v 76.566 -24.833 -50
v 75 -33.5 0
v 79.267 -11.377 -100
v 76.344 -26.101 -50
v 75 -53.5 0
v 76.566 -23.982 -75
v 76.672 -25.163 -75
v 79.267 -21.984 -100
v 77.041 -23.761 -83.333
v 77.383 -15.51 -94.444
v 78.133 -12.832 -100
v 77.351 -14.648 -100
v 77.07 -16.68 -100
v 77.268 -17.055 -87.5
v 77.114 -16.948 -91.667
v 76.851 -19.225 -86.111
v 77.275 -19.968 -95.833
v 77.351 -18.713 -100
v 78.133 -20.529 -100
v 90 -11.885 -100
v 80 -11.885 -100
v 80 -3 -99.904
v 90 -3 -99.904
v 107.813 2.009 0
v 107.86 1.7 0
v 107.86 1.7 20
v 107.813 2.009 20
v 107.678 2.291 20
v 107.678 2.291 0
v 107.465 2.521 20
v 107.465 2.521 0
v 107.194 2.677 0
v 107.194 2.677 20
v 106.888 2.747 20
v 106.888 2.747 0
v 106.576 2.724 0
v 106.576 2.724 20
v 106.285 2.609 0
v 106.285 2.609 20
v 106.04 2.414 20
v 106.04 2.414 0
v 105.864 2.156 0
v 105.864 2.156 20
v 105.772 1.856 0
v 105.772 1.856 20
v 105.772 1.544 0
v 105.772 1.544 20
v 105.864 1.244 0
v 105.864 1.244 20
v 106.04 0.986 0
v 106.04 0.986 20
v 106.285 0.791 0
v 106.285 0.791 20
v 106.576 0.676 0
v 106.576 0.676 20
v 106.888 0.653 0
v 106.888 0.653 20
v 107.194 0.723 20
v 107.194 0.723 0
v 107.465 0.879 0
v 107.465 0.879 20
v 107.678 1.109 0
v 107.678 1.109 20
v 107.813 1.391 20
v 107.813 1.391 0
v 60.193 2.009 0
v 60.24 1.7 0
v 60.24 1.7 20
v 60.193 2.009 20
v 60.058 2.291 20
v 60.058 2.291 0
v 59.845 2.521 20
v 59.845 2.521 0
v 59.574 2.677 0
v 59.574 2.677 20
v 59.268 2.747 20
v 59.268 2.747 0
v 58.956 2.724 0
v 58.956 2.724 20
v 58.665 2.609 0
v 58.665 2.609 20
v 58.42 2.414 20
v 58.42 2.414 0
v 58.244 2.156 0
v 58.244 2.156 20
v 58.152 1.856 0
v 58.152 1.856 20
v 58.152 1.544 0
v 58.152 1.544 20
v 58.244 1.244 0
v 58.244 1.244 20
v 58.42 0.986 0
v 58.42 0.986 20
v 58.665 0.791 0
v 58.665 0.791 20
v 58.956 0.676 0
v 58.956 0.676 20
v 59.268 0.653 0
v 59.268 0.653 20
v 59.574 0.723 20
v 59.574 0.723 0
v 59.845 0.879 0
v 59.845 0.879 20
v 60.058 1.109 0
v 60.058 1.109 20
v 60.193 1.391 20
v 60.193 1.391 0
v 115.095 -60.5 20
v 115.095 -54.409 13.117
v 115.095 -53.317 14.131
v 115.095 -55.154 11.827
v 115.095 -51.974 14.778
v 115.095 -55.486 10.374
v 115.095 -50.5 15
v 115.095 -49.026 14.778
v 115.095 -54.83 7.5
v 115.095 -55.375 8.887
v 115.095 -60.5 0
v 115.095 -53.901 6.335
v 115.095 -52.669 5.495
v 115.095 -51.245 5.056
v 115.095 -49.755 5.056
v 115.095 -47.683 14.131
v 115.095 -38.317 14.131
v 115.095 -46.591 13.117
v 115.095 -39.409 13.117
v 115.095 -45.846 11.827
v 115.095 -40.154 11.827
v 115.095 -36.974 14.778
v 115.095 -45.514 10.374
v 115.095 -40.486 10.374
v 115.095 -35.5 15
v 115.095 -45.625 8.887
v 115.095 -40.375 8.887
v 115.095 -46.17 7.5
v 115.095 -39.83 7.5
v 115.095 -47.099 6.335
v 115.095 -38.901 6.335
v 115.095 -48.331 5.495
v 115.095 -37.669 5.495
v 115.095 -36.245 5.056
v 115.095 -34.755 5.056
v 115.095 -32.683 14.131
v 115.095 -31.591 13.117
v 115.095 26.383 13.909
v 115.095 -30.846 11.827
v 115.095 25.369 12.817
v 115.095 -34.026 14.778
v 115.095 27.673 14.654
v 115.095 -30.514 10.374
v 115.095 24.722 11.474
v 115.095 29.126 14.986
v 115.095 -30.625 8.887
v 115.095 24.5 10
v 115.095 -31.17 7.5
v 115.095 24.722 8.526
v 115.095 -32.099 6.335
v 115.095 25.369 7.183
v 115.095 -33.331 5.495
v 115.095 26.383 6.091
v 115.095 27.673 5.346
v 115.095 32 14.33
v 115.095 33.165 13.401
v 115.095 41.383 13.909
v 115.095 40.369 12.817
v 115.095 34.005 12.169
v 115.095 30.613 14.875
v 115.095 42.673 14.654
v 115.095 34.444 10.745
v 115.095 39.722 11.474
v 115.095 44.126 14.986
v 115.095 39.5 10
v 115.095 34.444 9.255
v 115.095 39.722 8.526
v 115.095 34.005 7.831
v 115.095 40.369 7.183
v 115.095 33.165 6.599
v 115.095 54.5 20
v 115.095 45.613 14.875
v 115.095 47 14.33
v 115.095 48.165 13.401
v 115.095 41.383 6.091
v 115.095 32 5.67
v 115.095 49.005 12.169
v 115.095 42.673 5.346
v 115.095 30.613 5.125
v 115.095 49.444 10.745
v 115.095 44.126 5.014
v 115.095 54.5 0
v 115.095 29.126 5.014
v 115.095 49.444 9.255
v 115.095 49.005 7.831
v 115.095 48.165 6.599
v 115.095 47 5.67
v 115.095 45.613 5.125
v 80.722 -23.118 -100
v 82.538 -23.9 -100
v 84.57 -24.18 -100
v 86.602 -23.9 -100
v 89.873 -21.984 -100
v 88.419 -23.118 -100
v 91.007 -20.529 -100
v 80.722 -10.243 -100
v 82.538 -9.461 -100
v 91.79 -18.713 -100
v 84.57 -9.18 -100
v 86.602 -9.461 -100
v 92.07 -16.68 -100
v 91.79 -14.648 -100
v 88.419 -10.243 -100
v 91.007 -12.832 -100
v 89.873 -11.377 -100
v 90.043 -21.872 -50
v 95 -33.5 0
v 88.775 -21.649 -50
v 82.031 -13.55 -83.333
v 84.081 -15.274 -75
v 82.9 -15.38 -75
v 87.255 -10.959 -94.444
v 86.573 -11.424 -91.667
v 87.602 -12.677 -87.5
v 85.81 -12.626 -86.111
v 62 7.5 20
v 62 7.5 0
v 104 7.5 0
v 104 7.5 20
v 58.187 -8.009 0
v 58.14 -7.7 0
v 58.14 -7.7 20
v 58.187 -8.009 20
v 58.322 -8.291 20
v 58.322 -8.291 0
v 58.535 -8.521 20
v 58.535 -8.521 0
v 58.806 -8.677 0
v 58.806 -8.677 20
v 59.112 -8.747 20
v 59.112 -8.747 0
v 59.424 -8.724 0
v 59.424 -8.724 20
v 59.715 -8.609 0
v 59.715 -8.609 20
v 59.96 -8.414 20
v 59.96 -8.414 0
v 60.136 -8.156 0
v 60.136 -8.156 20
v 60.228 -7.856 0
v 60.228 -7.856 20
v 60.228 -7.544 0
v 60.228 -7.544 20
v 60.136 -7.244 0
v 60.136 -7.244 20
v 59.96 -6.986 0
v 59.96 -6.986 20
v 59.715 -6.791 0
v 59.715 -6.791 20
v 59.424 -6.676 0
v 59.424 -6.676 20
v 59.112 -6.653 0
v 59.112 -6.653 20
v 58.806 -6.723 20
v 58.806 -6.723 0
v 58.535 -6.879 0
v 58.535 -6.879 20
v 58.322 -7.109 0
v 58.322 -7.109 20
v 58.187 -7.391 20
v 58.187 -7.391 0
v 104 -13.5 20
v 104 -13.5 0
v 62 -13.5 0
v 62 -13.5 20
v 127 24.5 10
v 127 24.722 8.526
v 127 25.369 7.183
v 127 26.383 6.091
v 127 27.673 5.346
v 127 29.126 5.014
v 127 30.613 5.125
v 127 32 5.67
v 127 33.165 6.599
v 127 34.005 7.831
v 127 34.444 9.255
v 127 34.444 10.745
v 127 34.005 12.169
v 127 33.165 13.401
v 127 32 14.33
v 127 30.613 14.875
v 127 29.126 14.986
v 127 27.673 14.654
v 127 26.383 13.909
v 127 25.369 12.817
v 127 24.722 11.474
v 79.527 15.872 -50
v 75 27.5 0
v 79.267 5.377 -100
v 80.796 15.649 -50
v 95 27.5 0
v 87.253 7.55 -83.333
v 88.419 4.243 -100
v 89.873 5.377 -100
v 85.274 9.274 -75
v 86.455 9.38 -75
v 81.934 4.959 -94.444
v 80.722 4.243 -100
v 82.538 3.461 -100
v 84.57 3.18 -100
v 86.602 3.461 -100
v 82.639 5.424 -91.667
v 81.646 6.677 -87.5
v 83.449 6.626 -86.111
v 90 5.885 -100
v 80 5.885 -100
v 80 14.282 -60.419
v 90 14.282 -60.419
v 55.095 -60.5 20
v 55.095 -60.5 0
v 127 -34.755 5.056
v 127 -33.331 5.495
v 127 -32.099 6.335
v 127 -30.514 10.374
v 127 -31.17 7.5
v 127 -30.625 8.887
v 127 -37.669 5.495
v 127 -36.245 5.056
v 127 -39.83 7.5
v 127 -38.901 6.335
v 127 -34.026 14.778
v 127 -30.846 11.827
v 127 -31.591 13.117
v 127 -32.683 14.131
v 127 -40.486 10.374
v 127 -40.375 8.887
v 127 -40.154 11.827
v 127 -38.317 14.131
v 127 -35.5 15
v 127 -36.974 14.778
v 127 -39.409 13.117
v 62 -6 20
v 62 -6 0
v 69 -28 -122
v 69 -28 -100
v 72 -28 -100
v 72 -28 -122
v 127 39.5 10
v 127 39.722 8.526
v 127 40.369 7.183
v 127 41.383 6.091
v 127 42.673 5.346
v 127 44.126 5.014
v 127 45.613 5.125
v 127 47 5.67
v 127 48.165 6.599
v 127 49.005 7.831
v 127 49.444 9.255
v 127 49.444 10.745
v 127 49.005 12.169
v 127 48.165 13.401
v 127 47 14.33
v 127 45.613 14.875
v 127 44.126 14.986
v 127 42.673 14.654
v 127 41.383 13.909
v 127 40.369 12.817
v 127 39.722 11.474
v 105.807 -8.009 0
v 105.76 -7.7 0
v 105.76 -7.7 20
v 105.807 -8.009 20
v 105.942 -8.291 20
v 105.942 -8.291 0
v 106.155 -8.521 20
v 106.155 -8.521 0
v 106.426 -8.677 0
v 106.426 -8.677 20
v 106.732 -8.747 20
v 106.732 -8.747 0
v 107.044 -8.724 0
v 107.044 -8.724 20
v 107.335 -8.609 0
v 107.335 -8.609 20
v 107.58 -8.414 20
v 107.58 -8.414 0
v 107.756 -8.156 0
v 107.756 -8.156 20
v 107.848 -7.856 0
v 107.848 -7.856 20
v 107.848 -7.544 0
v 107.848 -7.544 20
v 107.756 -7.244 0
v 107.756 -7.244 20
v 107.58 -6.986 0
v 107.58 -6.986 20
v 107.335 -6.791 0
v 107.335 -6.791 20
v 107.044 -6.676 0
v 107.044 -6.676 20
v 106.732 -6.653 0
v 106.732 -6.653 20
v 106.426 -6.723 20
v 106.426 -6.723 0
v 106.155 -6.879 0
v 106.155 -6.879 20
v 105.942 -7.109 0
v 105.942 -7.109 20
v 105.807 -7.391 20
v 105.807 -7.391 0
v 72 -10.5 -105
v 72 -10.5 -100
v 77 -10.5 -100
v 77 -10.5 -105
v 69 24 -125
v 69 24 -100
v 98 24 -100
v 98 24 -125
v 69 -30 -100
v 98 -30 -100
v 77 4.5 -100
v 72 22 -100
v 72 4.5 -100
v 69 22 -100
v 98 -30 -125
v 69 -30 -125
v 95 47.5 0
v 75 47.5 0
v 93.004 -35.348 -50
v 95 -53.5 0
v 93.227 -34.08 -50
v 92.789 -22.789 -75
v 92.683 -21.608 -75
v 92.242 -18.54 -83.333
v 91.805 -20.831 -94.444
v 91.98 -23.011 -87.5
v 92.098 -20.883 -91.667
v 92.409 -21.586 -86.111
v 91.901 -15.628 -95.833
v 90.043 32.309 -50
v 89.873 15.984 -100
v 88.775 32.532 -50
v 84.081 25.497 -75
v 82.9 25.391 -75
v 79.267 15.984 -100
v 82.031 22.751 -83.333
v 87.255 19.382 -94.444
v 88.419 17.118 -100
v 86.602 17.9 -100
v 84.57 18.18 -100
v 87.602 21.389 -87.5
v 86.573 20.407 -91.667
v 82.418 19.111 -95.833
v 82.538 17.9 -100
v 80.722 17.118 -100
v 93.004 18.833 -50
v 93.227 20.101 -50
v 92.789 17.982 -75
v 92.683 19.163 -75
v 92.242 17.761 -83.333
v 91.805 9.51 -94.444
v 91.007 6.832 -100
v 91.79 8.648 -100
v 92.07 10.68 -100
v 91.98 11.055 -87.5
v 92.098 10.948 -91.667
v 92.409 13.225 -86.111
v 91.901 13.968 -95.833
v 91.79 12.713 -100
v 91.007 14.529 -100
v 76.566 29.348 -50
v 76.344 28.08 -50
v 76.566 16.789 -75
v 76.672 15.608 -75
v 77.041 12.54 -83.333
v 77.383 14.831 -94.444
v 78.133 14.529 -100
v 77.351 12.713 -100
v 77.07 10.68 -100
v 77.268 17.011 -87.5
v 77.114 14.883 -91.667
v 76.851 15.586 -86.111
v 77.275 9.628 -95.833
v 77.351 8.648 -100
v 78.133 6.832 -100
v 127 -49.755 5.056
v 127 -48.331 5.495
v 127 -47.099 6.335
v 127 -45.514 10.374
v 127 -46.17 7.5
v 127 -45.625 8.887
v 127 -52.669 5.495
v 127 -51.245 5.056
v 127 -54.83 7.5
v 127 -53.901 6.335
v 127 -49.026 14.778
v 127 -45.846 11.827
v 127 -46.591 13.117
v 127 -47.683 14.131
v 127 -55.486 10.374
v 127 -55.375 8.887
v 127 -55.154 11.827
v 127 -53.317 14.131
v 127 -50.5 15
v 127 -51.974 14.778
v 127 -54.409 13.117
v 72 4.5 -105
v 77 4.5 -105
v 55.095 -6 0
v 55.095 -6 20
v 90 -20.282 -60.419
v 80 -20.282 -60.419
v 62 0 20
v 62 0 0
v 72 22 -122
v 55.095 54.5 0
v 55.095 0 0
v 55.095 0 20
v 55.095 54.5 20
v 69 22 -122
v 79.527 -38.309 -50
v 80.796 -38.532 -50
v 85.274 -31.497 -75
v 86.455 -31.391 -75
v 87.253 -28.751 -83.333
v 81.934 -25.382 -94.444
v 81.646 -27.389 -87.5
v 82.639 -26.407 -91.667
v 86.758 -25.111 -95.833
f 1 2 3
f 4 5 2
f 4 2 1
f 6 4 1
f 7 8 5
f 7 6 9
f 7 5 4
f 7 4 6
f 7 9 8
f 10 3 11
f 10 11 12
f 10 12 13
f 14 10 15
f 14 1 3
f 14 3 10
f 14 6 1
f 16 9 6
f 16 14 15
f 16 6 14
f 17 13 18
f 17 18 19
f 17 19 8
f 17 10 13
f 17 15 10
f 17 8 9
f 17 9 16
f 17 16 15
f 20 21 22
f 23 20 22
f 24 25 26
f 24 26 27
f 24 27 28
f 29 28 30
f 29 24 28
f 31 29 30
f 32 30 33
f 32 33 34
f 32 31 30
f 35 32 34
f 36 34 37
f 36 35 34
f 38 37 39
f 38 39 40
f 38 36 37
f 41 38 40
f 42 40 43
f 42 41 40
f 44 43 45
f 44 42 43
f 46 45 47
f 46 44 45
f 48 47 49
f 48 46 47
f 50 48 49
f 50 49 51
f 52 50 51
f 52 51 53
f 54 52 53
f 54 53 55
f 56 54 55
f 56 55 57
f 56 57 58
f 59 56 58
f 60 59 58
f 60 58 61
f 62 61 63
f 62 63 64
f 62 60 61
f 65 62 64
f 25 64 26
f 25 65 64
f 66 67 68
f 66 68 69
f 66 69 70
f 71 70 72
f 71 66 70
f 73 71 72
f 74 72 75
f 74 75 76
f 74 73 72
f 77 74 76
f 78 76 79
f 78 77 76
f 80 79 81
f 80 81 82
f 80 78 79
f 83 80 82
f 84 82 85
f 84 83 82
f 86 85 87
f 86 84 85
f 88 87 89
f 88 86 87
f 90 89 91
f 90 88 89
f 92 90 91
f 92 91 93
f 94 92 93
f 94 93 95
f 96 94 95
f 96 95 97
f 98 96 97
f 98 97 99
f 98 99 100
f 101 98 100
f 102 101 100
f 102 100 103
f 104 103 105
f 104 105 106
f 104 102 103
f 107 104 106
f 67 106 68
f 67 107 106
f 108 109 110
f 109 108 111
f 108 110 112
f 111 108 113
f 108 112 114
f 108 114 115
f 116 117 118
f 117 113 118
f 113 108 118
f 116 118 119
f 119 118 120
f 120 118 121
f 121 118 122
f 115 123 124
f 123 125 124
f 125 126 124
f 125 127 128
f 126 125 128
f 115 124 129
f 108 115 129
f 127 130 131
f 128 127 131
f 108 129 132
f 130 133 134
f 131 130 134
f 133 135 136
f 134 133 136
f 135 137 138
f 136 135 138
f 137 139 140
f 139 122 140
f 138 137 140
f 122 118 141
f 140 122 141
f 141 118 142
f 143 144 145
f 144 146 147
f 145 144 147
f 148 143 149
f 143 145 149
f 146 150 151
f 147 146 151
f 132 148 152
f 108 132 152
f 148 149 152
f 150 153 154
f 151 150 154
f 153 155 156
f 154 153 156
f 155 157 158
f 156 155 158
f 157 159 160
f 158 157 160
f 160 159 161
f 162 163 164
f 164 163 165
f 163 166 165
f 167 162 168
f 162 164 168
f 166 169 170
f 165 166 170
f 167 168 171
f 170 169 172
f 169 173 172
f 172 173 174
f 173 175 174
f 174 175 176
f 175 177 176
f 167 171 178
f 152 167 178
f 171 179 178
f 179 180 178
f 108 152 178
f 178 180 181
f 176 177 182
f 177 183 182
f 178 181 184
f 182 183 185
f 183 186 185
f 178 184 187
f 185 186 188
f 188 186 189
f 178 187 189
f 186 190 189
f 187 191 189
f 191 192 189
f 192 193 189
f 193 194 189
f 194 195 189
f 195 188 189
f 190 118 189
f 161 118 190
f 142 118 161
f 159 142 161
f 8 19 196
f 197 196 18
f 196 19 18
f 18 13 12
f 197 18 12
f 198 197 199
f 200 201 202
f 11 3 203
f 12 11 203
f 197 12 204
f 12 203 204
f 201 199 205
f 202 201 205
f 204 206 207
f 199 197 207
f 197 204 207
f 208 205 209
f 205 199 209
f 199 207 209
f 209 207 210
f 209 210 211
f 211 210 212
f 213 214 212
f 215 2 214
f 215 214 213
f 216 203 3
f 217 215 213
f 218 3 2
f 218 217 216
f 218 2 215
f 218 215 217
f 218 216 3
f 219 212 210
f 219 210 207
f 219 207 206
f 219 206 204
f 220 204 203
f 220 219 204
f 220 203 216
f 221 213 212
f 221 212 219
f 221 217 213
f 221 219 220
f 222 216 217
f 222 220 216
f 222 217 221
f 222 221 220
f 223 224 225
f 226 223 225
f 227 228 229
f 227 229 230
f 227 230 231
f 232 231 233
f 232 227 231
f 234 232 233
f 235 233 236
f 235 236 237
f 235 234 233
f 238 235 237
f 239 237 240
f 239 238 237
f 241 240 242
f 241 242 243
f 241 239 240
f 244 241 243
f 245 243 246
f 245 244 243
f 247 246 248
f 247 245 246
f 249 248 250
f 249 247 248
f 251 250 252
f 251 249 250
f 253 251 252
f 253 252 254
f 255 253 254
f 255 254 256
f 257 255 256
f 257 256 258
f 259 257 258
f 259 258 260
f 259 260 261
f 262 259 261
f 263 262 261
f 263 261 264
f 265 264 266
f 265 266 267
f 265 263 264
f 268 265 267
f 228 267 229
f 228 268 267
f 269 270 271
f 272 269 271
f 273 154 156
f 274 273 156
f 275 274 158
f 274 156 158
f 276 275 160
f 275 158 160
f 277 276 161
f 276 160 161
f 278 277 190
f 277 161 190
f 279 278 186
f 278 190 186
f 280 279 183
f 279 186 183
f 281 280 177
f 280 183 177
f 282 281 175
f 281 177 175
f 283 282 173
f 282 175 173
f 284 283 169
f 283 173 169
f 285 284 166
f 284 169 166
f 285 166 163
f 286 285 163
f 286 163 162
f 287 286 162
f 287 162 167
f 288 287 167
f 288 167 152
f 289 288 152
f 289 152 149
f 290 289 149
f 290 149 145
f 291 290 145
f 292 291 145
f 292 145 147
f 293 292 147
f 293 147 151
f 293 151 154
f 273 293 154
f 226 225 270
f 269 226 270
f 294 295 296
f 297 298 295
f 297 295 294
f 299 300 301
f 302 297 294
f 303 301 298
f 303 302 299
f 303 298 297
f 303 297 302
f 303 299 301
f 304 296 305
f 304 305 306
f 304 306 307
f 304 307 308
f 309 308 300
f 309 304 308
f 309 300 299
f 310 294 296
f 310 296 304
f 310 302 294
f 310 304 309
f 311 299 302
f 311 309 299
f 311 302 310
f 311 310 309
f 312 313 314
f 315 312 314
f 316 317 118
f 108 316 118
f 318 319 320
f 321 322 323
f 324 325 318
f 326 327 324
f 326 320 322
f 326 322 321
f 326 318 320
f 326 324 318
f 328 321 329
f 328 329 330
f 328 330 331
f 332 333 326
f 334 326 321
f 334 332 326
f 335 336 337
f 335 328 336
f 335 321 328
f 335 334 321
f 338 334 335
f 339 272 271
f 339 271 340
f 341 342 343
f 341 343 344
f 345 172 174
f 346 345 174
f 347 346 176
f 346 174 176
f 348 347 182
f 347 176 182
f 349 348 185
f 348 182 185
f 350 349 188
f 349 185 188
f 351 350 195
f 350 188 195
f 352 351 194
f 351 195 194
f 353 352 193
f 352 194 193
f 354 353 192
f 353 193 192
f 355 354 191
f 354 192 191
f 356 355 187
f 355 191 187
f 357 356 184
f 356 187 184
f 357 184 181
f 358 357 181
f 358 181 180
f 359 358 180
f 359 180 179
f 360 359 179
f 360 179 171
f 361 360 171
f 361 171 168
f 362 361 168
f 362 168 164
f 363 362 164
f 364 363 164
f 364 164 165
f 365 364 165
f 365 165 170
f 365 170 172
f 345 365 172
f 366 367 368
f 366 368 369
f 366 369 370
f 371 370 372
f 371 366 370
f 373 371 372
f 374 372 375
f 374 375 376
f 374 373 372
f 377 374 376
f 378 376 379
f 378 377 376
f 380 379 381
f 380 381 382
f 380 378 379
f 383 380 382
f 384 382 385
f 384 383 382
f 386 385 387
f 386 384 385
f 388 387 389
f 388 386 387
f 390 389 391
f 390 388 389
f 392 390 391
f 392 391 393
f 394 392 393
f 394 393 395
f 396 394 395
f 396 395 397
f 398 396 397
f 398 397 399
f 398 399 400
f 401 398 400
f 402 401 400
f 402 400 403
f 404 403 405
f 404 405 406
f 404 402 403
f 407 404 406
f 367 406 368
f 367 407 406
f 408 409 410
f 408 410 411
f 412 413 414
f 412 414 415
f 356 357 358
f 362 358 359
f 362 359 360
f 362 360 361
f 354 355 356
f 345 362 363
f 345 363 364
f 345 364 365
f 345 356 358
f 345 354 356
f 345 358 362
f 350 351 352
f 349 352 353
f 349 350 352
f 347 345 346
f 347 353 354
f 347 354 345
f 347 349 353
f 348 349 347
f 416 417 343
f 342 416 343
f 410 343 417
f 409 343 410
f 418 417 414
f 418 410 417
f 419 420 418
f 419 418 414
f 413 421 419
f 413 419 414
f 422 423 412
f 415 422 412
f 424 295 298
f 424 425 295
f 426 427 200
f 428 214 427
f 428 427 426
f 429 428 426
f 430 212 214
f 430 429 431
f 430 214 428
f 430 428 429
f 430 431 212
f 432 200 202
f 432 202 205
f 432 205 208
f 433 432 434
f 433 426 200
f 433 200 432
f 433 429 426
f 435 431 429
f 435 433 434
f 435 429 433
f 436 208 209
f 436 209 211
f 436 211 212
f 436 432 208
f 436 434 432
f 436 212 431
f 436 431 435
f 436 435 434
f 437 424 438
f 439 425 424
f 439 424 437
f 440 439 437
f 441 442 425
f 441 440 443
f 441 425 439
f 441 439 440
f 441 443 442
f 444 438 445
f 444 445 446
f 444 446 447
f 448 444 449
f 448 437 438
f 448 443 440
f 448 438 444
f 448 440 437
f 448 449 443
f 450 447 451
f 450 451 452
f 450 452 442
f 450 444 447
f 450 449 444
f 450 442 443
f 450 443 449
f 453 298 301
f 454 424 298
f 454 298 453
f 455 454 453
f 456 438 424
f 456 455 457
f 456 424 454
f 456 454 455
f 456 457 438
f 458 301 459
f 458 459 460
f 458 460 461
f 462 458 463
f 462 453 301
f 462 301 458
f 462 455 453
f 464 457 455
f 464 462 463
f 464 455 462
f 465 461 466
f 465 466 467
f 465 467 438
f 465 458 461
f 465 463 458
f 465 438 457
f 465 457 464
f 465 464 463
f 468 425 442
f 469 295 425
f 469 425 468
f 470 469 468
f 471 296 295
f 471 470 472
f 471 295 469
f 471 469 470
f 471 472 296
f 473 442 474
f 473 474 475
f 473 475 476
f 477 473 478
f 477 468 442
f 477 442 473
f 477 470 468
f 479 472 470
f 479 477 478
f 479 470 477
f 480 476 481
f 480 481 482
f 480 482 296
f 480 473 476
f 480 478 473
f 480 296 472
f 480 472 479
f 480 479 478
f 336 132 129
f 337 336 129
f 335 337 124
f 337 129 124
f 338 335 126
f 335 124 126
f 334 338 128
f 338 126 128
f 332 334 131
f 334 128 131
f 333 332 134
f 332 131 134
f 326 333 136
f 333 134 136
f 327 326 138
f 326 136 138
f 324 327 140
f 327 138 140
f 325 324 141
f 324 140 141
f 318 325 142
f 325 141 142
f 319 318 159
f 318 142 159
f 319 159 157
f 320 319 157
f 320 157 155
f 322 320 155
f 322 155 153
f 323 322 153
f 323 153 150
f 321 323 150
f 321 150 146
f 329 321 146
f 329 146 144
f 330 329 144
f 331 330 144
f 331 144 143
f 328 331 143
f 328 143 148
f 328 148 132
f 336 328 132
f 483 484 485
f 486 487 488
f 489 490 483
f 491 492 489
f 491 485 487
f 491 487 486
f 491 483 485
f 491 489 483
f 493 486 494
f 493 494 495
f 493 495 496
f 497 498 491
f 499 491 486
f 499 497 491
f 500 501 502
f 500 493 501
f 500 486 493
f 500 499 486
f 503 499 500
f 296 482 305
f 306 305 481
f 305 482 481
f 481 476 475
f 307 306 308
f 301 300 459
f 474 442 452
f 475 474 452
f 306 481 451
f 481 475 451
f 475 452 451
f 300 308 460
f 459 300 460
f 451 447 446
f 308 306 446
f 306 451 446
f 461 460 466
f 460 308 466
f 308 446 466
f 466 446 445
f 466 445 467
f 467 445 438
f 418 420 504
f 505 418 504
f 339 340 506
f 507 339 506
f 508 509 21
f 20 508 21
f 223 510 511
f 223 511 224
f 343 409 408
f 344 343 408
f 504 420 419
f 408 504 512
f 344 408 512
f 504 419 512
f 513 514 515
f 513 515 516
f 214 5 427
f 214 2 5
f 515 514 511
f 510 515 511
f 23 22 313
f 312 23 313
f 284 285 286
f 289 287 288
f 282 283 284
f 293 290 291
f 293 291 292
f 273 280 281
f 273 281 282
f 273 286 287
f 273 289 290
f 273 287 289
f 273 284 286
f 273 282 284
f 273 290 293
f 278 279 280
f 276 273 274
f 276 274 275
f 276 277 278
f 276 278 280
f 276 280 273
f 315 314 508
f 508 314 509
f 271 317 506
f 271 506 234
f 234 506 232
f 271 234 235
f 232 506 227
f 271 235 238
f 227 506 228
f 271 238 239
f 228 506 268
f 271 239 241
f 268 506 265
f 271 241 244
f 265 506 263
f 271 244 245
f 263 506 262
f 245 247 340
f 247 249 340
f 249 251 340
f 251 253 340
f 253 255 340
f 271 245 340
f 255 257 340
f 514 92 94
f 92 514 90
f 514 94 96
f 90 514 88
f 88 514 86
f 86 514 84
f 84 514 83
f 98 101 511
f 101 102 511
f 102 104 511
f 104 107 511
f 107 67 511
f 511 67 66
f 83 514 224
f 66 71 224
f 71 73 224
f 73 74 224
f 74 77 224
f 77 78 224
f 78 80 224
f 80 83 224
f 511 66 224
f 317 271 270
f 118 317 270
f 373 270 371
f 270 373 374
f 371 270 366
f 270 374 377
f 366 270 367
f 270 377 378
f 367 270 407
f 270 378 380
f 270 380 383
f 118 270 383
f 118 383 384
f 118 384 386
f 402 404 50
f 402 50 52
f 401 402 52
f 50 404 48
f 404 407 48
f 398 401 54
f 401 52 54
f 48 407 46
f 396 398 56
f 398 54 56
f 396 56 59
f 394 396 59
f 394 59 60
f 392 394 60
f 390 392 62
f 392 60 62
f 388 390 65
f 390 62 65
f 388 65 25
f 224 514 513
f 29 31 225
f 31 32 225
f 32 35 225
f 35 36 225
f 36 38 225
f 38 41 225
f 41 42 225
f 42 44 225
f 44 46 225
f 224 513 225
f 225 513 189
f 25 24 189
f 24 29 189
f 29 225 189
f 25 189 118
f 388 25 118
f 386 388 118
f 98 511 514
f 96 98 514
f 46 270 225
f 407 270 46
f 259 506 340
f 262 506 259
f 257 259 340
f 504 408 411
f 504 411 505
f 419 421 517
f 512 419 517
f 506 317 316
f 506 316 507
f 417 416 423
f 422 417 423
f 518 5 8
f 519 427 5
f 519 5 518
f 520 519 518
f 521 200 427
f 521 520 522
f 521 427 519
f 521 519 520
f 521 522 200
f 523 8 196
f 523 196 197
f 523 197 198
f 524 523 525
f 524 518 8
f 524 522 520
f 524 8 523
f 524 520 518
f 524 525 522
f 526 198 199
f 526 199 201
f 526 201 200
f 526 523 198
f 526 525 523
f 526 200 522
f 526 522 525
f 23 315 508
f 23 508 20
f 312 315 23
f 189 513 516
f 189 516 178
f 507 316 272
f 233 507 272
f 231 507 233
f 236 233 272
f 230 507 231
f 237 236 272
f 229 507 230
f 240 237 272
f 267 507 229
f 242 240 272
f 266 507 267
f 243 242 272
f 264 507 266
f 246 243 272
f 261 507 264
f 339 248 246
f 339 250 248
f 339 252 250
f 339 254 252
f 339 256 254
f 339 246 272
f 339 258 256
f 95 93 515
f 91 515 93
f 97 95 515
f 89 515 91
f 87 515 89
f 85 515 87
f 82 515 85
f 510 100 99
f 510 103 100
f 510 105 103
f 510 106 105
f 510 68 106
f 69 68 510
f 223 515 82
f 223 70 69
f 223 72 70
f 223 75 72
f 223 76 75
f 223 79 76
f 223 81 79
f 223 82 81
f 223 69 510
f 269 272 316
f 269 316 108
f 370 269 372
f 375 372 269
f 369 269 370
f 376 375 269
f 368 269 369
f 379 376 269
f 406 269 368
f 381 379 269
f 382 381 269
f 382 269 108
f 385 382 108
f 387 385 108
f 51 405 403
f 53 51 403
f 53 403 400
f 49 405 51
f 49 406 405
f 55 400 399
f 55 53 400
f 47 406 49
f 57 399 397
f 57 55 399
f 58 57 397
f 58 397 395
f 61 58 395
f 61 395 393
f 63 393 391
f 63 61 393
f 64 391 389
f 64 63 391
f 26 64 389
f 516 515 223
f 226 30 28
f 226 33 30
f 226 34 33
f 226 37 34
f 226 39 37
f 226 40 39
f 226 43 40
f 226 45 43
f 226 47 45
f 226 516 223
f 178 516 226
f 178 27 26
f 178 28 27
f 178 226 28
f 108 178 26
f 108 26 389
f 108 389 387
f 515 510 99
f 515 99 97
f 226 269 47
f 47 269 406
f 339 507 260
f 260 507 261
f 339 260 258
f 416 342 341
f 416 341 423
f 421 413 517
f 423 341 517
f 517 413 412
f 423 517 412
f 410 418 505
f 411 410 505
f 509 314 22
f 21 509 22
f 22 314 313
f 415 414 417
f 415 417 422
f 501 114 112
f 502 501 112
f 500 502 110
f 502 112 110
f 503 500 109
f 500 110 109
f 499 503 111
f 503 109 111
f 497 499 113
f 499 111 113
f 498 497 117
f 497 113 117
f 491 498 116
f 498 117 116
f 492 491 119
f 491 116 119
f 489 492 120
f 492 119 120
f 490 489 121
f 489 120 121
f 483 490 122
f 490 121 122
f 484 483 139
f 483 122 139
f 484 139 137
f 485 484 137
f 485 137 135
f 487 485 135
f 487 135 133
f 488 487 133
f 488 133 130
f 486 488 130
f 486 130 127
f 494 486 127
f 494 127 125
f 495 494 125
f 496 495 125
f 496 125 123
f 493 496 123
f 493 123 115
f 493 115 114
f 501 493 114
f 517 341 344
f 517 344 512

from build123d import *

# Parameters (mm, degrees)
SKETCH_5_W            = 60
SKETCH_5_H            = 115
EXTRUDE_2_DEPTH       = 20
SKETCH_1_R            = 1.05
CUT_EXTRUDE_4_DEPTH   = 20
SKETCH_6_R            = 5
EXTRUDE_3_DEPTH       = 12
EXTRUDE_6_DEPTH       = 3
EXTRUDE_6_DEPTH_BACK  = 26
SKETCH_13_W           = 25
SKETCH_13_H           = 54
SKETCH_16_W           = 22
SKETCH_16_H           = 50
CUT_EXTRUDE_9_DEPTH   = 3
SKETCH_17_W           = 5
SKETCH_17_H           = 15
CUT_EXTRUDE_10_DEPTH  = 8
EXTRUDE_13_DEPTH      = 5
EXTRUDE_13_DEPTH_BACK = 5


with BuildPart() as part:
    # 草圖5 → 填料-伸長2 (new body)
    with BuildSketch(Plane.XY):
        with Locations((85.095319229, -3)):
            Rectangle(SKETCH_5_W, SKETCH_5_H)
    extrude(amount=EXTRUDE_2_DEPTH)

    # 草圖1 → 除料-伸長4 (cut)
    with BuildSketch(Plane.XY):
        with Locations((59.19, 1.7)):
            Circle(SKETCH_1_R)
        with Locations((106.81, 1.7)):
            Circle(SKETCH_1_R)
        with Locations(Location((106.81, -7.7, 0), (0, 0, 180))):
            Circle(SKETCH_1_R)
        with Locations(Location((59.19, -7.7, 0), (0, 0, 180))):
            Circle(SKETCH_1_R)
        Polygon((55, -3), (55, 0), (62, 0), (62, 7.5), (104, 7.5), (104, -13.5), (62, -13.5), (62, -6), (55, -6), align=None)
    extrude(amount=CUT_EXTRUDE_4_DEPTH, mode=Mode.SUBTRACT)

    # 草圖6 → 填料-伸長3 (add)
    with BuildSketch(Plane(origin=(115, 0, 0), x_dir=(0, 0, -1), z_dir=(1, 0, 0))):
        with Locations(Location((-10, 44.5, 0), (0, 0, 270))):
            Circle(SKETCH_6_R)
        with Locations(Location((-10, 29.5, 0), (0, 0, 270))):
            Circle(SKETCH_6_R)
        with Locations(Location((-10, -35.5, 0), (0, 0, 180))):
            Circle(SKETCH_6_R)
        with Locations(Location((-10, -50.5, 0), (0, 0, 180))):
            Circle(SKETCH_6_R)
    extrude(amount=EXTRUDE_3_DEPTH)


with BuildPart() as body_2:
    # 草圖13 → 填料-伸長6 (new, two sides: drawn at the far end of the back side and taken through both)
    with BuildSketch(Plane(origin=(95, 0, 0), x_dir=(0, 0, -1), z_dir=(1, 0, 0)).offset(-EXTRUDE_6_DEPTH_BACK)):
        with Locations((112.5, -3)):
            Rectangle(SKETCH_13_W, SKETCH_13_H)
    extrude(amount=EXTRUDE_6_DEPTH + EXTRUDE_6_DEPTH_BACK)

    # 草圖16 → 除料-伸長9 (cut)
    with BuildSketch(Plane(origin=(69, 0, 0), x_dir=(0, 0, -1), z_dir=(1, 0, 0))):
        with Locations((111, -3)):
            Rectangle(SKETCH_16_W, SKETCH_16_H)
    extrude(amount=CUT_EXTRUDE_9_DEPTH, mode=Mode.SUBTRACT)

    # 草圖17 → 除料-伸長10 (cut)
    with BuildSketch(Plane(origin=(69, 0, 0), x_dir=(0, 0, -1), z_dir=(1, 0, 0))):
        with Locations((102.5, -3)):
            Rectangle(SKETCH_17_W, SKETCH_17_H)
    extrude(amount=CUT_EXTRUDE_10_DEPTH, mode=Mode.SUBTRACT)


with BuildPart() as body_3:
    # 草圖21 → 填料-伸長13 (new, two sides: drawn at the far end of the back side and taken through both)
    with BuildSketch(Plane(origin=(85, 0, 0), x_dir=(0, 0, -1), z_dir=(1, 0, 0)).offset(-EXTRUDE_13_DEPTH_BACK)):
        Polygon((60.419110579, 14.282390183), (60.419110579, -20.282390183), (100, -11.88497246), (99.903514788, -3), (100, 5.88497246), align=None)
    extrude(amount=EXTRUDE_13_DEPTH + EXTRUDE_13_DEPTH_BACK)


with BuildPart() as body_4:
    # Knit 1: read off the stored shape, not the designer's step
    # Knit 1: loft between two sections, ruled curve by curve
    knit_1_from = [
        Edge.make_bspline([(79.266895317, 5.377196179, -100), (79.579395317, 5.064696179, -100), (79.931362244, 4.768290315, -100), (80.709511323, 4.233165726, -100), (81.135733214, 3.994620259, -100), (82.046998926, 3.600245646, -100), (82.531971403, 3.444609801, -100), (83.534778832, 3.234670337, -100), (84.052429223, 3.180497037, -100), (85.087963129, 3.180497037, -100), (85.60561352, 3.234670337, -100), (86.608420949, 3.444609801, -100), (87.093393426, 3.600245646, -100), (88.004659138, 3.994620259, -100), (88.430881029, 4.233165726, -100), (89.209030109, 4.768290315, -100), (89.560997035, 5.064696179, -100), (89.873497035, 5.377196179, -100)], [0, 0, 0, 0, 0.125, 0.125, 0.25, 0.25, 0.375, 0.375, 0.5, 0.5, 0.625, 0.625, 0.75, 0.75, 0.875, 0.875, 1, 1, 1, 1], 3),
        Edge.make_bspline([(89.873497035, 5.377196179, -100), (90.185997035, 5.689696179, -100), (90.482402899, 6.041663105, -100), (91.017527488, 6.819812184, -100), (91.256072955, 7.246034075, -100), (91.650447568, 8.157299787, -100), (91.806083413, 8.642272265, -100), (92.016022877, 9.645079694, -100), (92.070196176, 10.162730084, -100), (92.070196176, 11.19826399, -100), (92.016022877, 11.715914381, -100), (91.806083413, 12.71872181, -100), (91.650447568, 13.203694288, -100), (91.256072955, 14.11496, -100), (91.017527488, 14.541181891, -100), (90.482402899, 15.31933097, -100), (90.185997035, 15.671297896, -100), (89.873497035, 15.983797896, -100)], [0, 0, 0, 0, 0.125, 0.125, 0.25, 0.25, 0.375, 0.375, 0.5, 0.5, 0.625, 0.625, 0.75, 0.75, 0.875, 0.875, 1, 1, 1, 1], 3),
        Edge.make_bspline([(79.266895317, 15.983797896, -100), (78.954395317, 15.671297896, -100), (78.657989454, 15.31933097, -100), (78.122864864, 14.541181891, -100), (77.884319398, 14.11496, -100), (77.489944785, 13.203694288, -100), (77.334308939, 12.71872181, -100), (77.124369476, 11.715914381, -100), (77.070196176, 11.19826399, -100), (77.070196176, 10.162730084, -100), (77.124369476, 9.645079694, -100), (77.334308939, 8.642272265, -100), (77.489944785, 8.157299787, -100), (77.884319398, 7.246034075, -100), (78.122864864, 6.819812184, -100), (78.657989454, 6.041663105, -100), (78.954395317, 5.689696179, -100), (79.266895317, 5.377196179, -100)], [0, 0, 0, 0, 0.125, 0.125, 0.25, 0.25, 0.375, 0.375, 0.5, 0.5, 0.625, 0.625, 0.75, 0.75, 0.875, 0.875, 1, 1, 1, 1], 3),
        Edge.make_bspline([(89.873497035, 15.983797896, -100), (89.560997035, 16.296297896, -100), (89.209030109, 16.59270376, -100), (88.430881029, 17.127828349, -100), (88.004659138, 17.366373816, -100), (87.093393426, 17.760748429, -100), (86.608420949, 17.916384274, -100), (85.60561352, 18.126323738, -100), (85.087963129, 18.180497037, -100), (84.052429223, 18.180497037, -100), (83.534778832, 18.126323738, -100), (82.531971403, 17.916384274, -100), (82.046998926, 17.760748429, -100), (81.135733214, 17.366373816, -100), (80.709511323, 17.127828349, -100), (79.931362244, 16.59270376, -100), (79.579395317, 16.296297896, -100), (79.266895317, 15.983797896, -100)], [0, 0, 0, 0, 0.125, 0.125, 0.25, 0.25, 0.375, 0.375, 0.5, 0.5, 0.625, 0.625, 0.75, 0.75, 0.875, 0.875, 1, 1, 1, 1], 3),
    ]
    knit_1_to = [
        Edge.make_bspline([(75, 27.5, 0), (75.833333333, 27.5, 0), (76.666666667, 27.5, 0), (78.333333333, 27.5, 0), (79.166666667, 27.5, 0), (80.833333333, 27.5, 0), (81.666666667, 27.5, 0), (83.333333333, 27.5, 0), (84.166666667, 27.5, 0), (85.833333333, 27.5, 0), (86.666666667, 27.5, 0), (88.333333333, 27.5, 0), (89.166666667, 27.5, 0), (90.833333333, 27.5, 0), (91.666666667, 27.5, 0), (93.333333333, 27.5, 0), (94.166666667, 27.5, 0), (95, 27.5, 0)], [0, 0, 0, 0, 0.125, 0.125, 0.25, 0.25, 0.375, 0.375, 0.5, 0.5, 0.625, 0.625, 0.75, 0.75, 0.875, 0.875, 1, 1, 1, 1], 3),
        Edge.make_bspline([(95, 27.5, 0), (95, 28.333333333, 0), (95, 29.166666667, 0), (95, 30.833333333, 0), (95, 31.666666667, 0), (95, 33.333333333, 0), (95, 34.166666667, 0), (95, 35.833333333, 0), (95, 36.666666667, 0), (95, 38.333333333, 0), (95, 39.166666667, 0), (95, 40.833333333, 0), (95, 41.666666667, 0), (95, 43.333333333, 0), (95, 44.166666667, 0), (95, 45.833333333, 0), (95, 46.666666667, 0), (95, 47.5, 0)], [0, 0, 0, 0, 0.125, 0.125, 0.25, 0.25, 0.375, 0.375, 0.5, 0.5, 0.625, 0.625, 0.75, 0.75, 0.875, 0.875, 1, 1, 1, 1], 3),
        Edge.make_bspline([(75, 47.5, 0), (75, 46.666666667, 0), (75, 45.833333333, 0), (75, 44.166666667, 0), (75, 43.333333333, 0), (75, 41.666666667, 0), (75, 40.833333333, 0), (75, 39.166666667, 0), (75, 38.333333333, 0), (75, 36.666666667, 0), (75, 35.833333333, 0), (75, 34.166666667, 0), (75, 33.333333333, 0), (75, 31.666666667, 0), (75, 30.833333333, 0), (75, 29.166666667, 0), (75, 28.333333333, 0), (75, 27.5, 0)], [0, 0, 0, 0, 0.125, 0.125, 0.25, 0.25, 0.375, 0.375, 0.5, 0.5, 0.625, 0.625, 0.75, 0.75, 0.875, 0.875, 1, 1, 1, 1], 3),
        Edge.make_bspline([(95, 47.5, 0), (94.166666667, 47.5, 0), (93.333333333, 47.5, 0), (91.666666667, 47.5, 0), (90.833333333, 47.5, 0), (89.166666667, 47.5, 0), (88.333333333, 47.5, 0), (86.666666667, 47.5, 0), (85.833333333, 47.5, 0), (84.166666667, 47.5, 0), (83.333333333, 47.5, 0), (81.666666667, 47.5, 0), (80.833333333, 47.5, 0), (79.166666667, 47.5, 0), (78.333333333, 47.5, 0), (76.666666667, 47.5, 0), (75.833333333, 47.5, 0), (75, 47.5, 0)], [0, 0, 0, 0, 0.125, 0.125, 0.25, 0.25, 0.375, 0.375, 0.5, 0.5, 0.625, 0.625, 0.75, 0.75, 0.875, 0.875, 1, 1, 1, 1], 3),
    ]
    knit_1 = Solid(Shell([*[Face.make_surface_from_curves(knit_1_from[k], knit_1_to[k]) for k in range(4)], Face(Wire(knit_1_from)), Face(Wire(knit_1_to))]))
    add(knit_1)


with BuildPart() as body_5:
    # Knit 2: read off the stored shape, not the designer's step
    # Knit 2: loft between two sections, ruled curve by curve
    knit_2_from = [
        Edge.make_bspline([(79.266895317, -21.983797896, -100), (79.579395317, -22.296297896, -100), (79.931362244, -22.59270376, -100), (80.709511323, -23.127828349, -100), (81.135733214, -23.366373816, -100), (82.046998926, -23.760748429, -100), (82.531971403, -23.916384274, -100), (83.534778832, -24.126323738, -100), (84.052429223, -24.180497037, -100), (85.087963129, -24.180497037, -100), (85.60561352, -24.126323738, -100), (86.608420949, -23.916384274, -100), (87.093393426, -23.760748429, -100), (88.004659138, -23.366373816, -100), (88.430881029, -23.127828349, -100), (89.209030109, -22.59270376, -100), (89.560997035, -22.296297896, -100), (89.873497035, -21.983797896, -100)], [0, 0, 0, 0, 0.125, 0.125, 0.25, 0.25, 0.375, 0.375, 0.5, 0.5, 0.625, 0.625, 0.75, 0.75, 0.875, 0.875, 1, 1, 1, 1], 3),
        Edge.make_bspline([(89.873497035, -21.983797896, -100), (90.185997035, -21.671297896, -100), (90.482402899, -21.31933097, -100), (91.017527488, -20.541181891, -100), (91.256072955, -20.11496, -100), (91.650447568, -19.203694288, -100), (91.806083413, -18.71872181, -100), (92.016022877, -17.715914381, -100), (92.070196176, -17.19826399, -100), (92.070196176, -16.162730084, -100), (92.016022877, -15.645079694, -100), (91.806083413, -14.642272265, -100), (91.650447568, -14.157299787, -100), (91.256072955, -13.246034075, -100), (91.017527488, -12.819812184, -100), (90.482402899, -12.041663105, -100), (90.185997035, -11.689696179, -100), (89.873497035, -11.377196179, -100)], [0, 0, 0, 0, 0.125, 0.125, 0.25, 0.25, 0.375, 0.375, 0.5, 0.5, 0.625, 0.625, 0.75, 0.75, 0.875, 0.875, 1, 1, 1, 1], 3),
        Edge.make_bspline([(79.266895317, -11.377196179, -100), (78.954395317, -11.689696179, -100), (78.657989454, -12.041663105, -100), (78.122864864, -12.819812184, -100), (77.884319398, -13.246034075, -100), (77.489944785, -14.157299787, -100), (77.334308939, -14.642272265, -100), (77.124369476, -15.645079694, -100), (77.070196176, -16.162730084, -100), (77.070196176, -17.19826399, -100), (77.124369476, -17.715914381, -100), (77.334308939, -18.71872181, -100), (77.489944785, -19.203694288, -100), (77.884319398, -20.11496, -100), (78.122864864, -20.541181891, -100), (78.657989454, -21.31933097, -100), (78.954395317, -21.671297896, -100), (79.266895317, -21.983797896, -100)], [0, 0, 0, 0, 0.125, 0.125, 0.25, 0.25, 0.375, 0.375, 0.5, 0.5, 0.625, 0.625, 0.75, 0.75, 0.875, 0.875, 1, 1, 1, 1], 3),
        Edge.make_bspline([(89.873497035, -11.377196179, -100), (89.560997035, -11.064696179, -100), (89.209030109, -10.768290315, -100), (88.430881029, -10.233165726, -100), (88.004659138, -9.994620259, -100), (87.093393426, -9.600245646, -100), (86.608420949, -9.444609801, -100), (85.60561352, -9.234670337, -100), (85.087963129, -9.180497037, -100), (84.052429223, -9.180497037, -100), (83.534778832, -9.234670337, -100), (82.531971403, -9.444609801, -100), (82.046998926, -9.600245646, -100), (81.135733214, -9.994620259, -100), (80.709511323, -10.233165726, -100), (79.931362244, -10.768290315, -100), (79.579395317, -11.064696179, -100), (79.266895317, -11.377196179, -100)], [0, 0, 0, 0, 0.125, 0.125, 0.25, 0.25, 0.375, 0.375, 0.5, 0.5, 0.625, 0.625, 0.75, 0.75, 0.875, 0.875, 1, 1, 1, 1], 3),
    ]
    knit_2_to = [
        Edge.make_bspline([(75, -53.5, 0), (75.833333333, -53.5, 0), (76.666666667, -53.5, 0), (78.333333333, -53.5, 0), (79.166666667, -53.5, 0), (80.833333333, -53.5, 0), (81.666666667, -53.5, 0), (83.333333333, -53.5, 0), (84.166666667, -53.5, 0), (85.833333333, -53.5, 0), (86.666666667, -53.5, 0), (88.333333333, -53.5, 0), (89.166666667, -53.5, 0), (90.833333333, -53.5, 0), (91.666666667, -53.5, 0), (93.333333333, -53.5, 0), (94.166666667, -53.5, 0), (95, -53.5, 0)], [0, 0, 0, 0, 0.125, 0.125, 0.25, 0.25, 0.375, 0.375, 0.5, 0.5, 0.625, 0.625, 0.75, 0.75, 0.875, 0.875, 1, 1, 1, 1], 3),
        Edge.make_bspline([(95, -53.5, 0), (95, -52.666666667, 0), (95, -51.833333333, 0), (95, -50.166666667, 0), (95, -49.333333333, 0), (95, -47.666666667, 0), (95, -46.833333333, 0), (95, -45.166666667, 0), (95, -44.333333333, 0), (95, -42.666666667, 0), (95, -41.833333333, 0), (95, -40.166666667, 0), (95, -39.333333333, 0), (95, -37.666666667, 0), (95, -36.833333333, 0), (95, -35.166666667, 0), (95, -34.333333333, 0), (95, -33.5, 0)], [0, 0, 0, 0, 0.125, 0.125, 0.25, 0.25, 0.375, 0.375, 0.5, 0.5, 0.625, 0.625, 0.75, 0.75, 0.875, 0.875, 1, 1, 1, 1], 3),
        Edge.make_bspline([(75, -33.5, 0), (75, -34.333333333, 0), (75, -35.166666667, 0), (75, -36.833333333, 0), (75, -37.666666667, 0), (75, -39.333333333, 0), (75, -40.166666667, 0), (75, -41.833333333, 0), (75, -42.666666667, 0), (75, -44.333333333, 0), (75, -45.166666667, 0), (75, -46.833333333, 0), (75, -47.666666667, 0), (75, -49.333333333, 0), (75, -50.166666667, 0), (75, -51.833333333, 0), (75, -52.666666667, 0), (75, -53.5, 0)], [0, 0, 0, 0, 0.125, 0.125, 0.25, 0.25, 0.375, 0.375, 0.5, 0.5, 0.625, 0.625, 0.75, 0.75, 0.875, 0.875, 1, 1, 1, 1], 3),
        Edge.make_bspline([(95, -33.5, 0), (94.166666667, -33.5, 0), (93.333333333, -33.5, 0), (91.666666667, -33.5, 0), (90.833333333, -33.5, 0), (89.166666667, -33.5, 0), (88.333333333, -33.5, 0), (86.666666667, -33.5, 0), (85.833333333, -33.5, 0), (84.166666667, -33.5, 0), (83.333333333, -33.5, 0), (81.666666667, -33.5, 0), (80.833333333, -33.5, 0), (79.166666667, -33.5, 0), (78.333333333, -33.5, 0), (76.666666667, -33.5, 0), (75.833333333, -33.5, 0), (75, -33.5, 0)], [0, 0, 0, 0, 0.125, 0.125, 0.25, 0.25, 0.375, 0.375, 0.5, 0.5, 0.625, 0.625, 0.75, 0.75, 0.875, 0.875, 1, 1, 1, 1], 3),
    ]
    knit_2 = Solid(Shell([*[Face.make_surface_from_curves(knit_2_from[k], knit_2_to[k]) for k in range(4)], Face(Wire(knit_2_from)), Face(Wire(knit_2_to))]))
    add(knit_2)


solid = Compound([part.part, body_2.part, body_3.part, body_4.part, body_5.part])
